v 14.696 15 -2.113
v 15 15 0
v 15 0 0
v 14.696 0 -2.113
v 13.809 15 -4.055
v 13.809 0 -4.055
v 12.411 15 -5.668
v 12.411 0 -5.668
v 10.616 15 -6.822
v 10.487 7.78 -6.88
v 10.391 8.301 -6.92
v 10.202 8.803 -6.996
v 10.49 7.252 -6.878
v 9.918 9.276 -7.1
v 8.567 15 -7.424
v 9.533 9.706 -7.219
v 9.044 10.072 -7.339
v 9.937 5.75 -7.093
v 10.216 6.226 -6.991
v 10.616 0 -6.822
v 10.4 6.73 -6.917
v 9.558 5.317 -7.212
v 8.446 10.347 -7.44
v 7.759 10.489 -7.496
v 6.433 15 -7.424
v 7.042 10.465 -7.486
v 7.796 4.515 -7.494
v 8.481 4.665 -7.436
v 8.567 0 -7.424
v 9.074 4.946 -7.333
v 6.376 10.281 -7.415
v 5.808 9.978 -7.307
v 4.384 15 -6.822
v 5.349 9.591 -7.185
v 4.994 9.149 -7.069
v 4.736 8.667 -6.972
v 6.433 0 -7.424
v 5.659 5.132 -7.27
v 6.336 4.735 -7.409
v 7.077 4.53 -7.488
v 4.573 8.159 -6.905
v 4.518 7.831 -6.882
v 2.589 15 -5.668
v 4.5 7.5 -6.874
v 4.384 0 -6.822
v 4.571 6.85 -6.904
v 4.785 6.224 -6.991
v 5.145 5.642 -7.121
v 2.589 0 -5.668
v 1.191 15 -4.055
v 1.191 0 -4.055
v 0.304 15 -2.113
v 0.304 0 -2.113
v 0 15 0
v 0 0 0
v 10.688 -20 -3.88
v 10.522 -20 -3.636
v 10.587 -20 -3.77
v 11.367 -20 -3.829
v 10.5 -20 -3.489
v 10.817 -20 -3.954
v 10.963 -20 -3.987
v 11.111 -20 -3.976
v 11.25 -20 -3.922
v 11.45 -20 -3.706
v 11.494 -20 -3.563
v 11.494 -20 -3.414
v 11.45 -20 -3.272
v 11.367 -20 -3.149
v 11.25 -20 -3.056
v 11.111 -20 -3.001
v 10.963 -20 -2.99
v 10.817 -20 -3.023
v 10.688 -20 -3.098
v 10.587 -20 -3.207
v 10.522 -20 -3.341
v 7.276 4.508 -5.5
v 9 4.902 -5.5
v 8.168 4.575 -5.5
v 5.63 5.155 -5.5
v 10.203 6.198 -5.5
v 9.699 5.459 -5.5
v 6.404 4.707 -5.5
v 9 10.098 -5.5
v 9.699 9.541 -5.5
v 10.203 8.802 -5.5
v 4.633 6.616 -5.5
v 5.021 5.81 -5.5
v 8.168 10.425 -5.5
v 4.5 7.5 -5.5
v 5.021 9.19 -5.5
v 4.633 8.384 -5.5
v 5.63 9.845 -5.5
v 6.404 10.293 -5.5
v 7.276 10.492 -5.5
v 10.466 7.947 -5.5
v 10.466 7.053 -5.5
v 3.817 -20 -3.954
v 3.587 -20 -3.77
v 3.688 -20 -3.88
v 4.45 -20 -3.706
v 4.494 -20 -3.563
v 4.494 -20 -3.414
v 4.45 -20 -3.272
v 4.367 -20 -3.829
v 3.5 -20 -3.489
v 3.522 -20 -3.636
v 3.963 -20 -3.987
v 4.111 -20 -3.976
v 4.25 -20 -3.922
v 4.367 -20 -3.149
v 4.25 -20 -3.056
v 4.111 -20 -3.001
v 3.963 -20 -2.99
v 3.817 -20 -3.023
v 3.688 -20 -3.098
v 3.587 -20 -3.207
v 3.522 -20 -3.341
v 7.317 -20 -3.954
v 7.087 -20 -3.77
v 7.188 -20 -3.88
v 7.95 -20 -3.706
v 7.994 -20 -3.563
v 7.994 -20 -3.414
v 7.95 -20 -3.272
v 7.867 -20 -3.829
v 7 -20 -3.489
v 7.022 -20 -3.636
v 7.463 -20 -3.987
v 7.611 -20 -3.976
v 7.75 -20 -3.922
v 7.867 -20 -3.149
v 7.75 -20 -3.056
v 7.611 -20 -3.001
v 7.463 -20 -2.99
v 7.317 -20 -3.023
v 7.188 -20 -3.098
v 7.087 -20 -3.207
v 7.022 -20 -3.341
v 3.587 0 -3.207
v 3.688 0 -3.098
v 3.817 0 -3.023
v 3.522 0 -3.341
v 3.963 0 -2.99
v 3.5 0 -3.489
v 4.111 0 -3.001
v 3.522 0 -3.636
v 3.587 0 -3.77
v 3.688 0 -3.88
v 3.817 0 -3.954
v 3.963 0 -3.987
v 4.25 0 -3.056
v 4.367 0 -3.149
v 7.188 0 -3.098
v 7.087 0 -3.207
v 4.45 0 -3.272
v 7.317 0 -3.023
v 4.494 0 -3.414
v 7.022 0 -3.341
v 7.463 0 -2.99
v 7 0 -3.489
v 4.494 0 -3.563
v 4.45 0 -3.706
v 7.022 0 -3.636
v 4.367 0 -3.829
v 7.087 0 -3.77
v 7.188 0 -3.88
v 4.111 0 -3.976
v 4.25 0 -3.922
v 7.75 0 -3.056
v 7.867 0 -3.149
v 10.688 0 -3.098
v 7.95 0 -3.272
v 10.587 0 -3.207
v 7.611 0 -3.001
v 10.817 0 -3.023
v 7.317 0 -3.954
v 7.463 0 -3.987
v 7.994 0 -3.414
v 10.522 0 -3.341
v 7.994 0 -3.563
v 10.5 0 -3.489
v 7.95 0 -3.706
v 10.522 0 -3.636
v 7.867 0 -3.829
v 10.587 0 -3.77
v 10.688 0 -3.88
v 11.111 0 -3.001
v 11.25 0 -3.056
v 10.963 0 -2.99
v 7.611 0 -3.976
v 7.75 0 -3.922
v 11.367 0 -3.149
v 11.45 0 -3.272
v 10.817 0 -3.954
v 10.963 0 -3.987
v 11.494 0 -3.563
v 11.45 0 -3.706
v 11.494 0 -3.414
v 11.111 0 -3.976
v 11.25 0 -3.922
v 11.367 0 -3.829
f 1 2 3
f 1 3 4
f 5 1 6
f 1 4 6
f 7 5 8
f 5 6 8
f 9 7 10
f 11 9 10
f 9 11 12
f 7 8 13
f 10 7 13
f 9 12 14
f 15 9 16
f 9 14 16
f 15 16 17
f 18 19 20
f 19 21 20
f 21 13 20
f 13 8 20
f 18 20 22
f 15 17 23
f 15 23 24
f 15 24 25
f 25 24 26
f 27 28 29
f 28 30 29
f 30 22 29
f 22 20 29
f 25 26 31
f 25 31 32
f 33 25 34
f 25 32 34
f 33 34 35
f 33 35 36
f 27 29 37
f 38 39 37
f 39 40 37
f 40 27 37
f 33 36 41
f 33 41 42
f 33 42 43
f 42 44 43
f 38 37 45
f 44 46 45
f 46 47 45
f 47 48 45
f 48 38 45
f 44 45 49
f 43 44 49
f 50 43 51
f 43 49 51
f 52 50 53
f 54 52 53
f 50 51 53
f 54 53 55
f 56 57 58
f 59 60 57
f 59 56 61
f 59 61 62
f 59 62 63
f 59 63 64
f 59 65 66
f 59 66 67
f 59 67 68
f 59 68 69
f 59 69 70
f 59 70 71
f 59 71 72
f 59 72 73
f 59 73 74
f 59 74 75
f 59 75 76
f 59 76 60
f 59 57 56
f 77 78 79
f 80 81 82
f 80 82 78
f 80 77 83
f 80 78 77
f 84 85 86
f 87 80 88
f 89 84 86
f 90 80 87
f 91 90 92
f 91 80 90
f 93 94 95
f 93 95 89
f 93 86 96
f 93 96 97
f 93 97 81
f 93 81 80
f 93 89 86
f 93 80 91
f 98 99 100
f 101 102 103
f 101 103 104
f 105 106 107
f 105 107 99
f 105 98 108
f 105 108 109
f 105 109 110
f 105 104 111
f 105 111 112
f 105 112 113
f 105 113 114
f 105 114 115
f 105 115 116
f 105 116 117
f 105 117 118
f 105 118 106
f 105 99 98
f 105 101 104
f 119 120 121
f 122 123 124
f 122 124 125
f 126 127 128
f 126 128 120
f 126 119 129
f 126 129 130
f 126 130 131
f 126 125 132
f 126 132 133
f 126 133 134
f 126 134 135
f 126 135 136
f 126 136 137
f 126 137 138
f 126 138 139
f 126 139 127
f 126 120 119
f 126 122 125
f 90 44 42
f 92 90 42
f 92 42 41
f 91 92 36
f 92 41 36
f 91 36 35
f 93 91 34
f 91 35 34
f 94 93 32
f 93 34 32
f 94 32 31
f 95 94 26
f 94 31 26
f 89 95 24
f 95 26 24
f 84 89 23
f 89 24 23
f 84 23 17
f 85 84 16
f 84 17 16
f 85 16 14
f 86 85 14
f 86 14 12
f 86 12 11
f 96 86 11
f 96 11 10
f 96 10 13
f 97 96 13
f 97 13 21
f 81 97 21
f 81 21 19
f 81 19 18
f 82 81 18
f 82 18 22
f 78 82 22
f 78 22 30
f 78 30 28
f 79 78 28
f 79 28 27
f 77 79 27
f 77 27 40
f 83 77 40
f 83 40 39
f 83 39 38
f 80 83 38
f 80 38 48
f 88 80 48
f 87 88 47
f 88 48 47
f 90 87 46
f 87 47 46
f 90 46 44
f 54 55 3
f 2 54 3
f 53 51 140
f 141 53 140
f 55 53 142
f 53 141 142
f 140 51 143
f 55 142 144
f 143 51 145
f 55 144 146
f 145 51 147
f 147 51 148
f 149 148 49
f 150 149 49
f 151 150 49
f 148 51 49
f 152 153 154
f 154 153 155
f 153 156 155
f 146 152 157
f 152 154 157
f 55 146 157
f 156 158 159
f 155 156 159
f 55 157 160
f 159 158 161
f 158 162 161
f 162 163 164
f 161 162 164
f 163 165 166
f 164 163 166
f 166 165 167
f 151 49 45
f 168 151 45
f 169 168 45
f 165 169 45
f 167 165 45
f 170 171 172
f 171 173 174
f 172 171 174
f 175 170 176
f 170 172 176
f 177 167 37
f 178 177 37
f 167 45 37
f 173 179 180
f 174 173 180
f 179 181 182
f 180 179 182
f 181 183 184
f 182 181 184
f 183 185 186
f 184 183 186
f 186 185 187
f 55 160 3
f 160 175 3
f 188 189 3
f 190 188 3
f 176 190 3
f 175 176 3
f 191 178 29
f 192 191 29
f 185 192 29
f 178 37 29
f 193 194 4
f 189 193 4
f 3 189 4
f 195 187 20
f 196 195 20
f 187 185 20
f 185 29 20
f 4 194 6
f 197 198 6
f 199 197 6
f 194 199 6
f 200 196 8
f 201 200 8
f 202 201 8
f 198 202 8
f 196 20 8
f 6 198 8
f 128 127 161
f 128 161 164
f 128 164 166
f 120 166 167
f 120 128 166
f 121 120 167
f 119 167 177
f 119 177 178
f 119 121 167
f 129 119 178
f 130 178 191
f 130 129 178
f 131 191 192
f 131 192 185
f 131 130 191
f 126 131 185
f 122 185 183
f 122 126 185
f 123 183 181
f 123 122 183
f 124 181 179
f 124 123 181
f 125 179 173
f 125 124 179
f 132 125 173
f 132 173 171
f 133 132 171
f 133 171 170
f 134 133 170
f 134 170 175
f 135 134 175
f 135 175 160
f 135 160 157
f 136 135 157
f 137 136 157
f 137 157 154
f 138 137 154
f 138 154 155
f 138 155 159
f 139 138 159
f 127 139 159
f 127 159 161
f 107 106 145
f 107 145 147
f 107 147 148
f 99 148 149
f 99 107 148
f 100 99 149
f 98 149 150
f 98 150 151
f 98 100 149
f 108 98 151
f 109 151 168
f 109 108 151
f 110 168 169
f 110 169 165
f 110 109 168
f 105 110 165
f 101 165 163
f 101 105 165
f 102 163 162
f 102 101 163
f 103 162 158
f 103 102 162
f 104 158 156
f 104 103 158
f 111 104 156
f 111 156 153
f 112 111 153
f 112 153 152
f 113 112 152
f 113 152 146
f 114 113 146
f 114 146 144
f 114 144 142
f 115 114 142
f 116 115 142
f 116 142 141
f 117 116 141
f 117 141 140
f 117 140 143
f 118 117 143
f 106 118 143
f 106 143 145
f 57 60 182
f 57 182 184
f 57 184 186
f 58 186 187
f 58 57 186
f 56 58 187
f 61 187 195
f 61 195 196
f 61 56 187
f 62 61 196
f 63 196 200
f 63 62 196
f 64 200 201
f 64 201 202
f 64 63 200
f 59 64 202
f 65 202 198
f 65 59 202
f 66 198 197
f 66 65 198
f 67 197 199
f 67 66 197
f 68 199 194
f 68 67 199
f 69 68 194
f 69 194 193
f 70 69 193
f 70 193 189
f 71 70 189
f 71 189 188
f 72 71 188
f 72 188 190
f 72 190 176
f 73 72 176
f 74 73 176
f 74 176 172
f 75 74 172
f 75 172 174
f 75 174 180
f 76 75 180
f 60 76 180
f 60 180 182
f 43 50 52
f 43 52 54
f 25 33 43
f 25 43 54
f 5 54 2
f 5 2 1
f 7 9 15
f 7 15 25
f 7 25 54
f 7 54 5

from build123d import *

# Parameters (mm, degrees)
Y_KSEKLIK_EKSTR_ZYON1_DEPTH = 15
IZIM4_R                     = 3
KES_EKSTR_ZYON1_DEPTH       = 2
IZIM8_R                     = 0.5
IZIM10_R                    = 0.5
IZIM11_R                    = 0.5


with BuildPart() as part:
    # Çizim1 → Yükseklik-Ekstrüzyon1 (new body)
    with BuildSketch(Plane(origin=(0, 0, 0), x_dir=(1, 0, 0), z_dir=(0, 1, 0))):
        with BuildLine():
            Line((0, 0), (15, 0))
            ThreePointArc((15, 0), (7.5, 7.5), (0, 0))
        make_face()
    extrude(amount=Y_KSEKLIK_EKSTR_ZYON1_DEPTH)

    # Çizim4 → Kes-Ekstrüzyon1 (cut)
    with BuildSketch(Plane(origin=(7.5, 15, -7.5), x_dir=(-1, 0, 0), z_dir=(0, 0, -1))):
        with Locations((0, -7.5)):
            Circle(IZIM4_R)
    extrude(amount=-KES_EKSTR_ZYON1_DEPTH, mode=Mode.SUBTRACT)

    # Süpür1: sweep along a curve in space
    with BuildLine() as s_p_r1_path:
        Line((11, 0, -3.488617215), (11, -20, -3.488617215))
    # Çizim8 → Süpür1 (sweep)
    with BuildSketch(Plane(origin=(4, -20, -3.488617215), x_dir=(-1, 0, 0), z_dir=(0, -1, 0))):
        with Locations((-7, 0)):
            Circle(IZIM8_R)
    sweep(path=s_p_r1_path.line)

    # Süpür2: sweep along a curve in space
    with BuildLine() as s_p_r2_path:
        Line((7.5, 0, -3.488617215), (7.5, -20, -3.488617215))
    # Çizim10 → Süpür2 (sweep)
    with BuildSketch(Plane(origin=(4, -20, -3.488617215), x_dir=(-1, 0, 0), z_dir=(0, -1, 0))):
        with Locations((-3.5, 0)):
            Circle(IZIM10_R)
    sweep(path=s_p_r2_path.line)

    # Süpür3: sweep along a curve in space
    with BuildLine() as s_p_r3_path:
        Line((4, 0, -3.488617215), (4, -20, -3.488617215))
    # Çizim11 → Süpür3 (sweep)
    with BuildSketch(Plane(origin=(4, -20, -3.488617215), x_dir=(-1, 0, 0), z_dir=(0, -1, 0))):
        Circle(IZIM11_R)
    sweep(path=s_p_r3_path.line)


solid = part.part
